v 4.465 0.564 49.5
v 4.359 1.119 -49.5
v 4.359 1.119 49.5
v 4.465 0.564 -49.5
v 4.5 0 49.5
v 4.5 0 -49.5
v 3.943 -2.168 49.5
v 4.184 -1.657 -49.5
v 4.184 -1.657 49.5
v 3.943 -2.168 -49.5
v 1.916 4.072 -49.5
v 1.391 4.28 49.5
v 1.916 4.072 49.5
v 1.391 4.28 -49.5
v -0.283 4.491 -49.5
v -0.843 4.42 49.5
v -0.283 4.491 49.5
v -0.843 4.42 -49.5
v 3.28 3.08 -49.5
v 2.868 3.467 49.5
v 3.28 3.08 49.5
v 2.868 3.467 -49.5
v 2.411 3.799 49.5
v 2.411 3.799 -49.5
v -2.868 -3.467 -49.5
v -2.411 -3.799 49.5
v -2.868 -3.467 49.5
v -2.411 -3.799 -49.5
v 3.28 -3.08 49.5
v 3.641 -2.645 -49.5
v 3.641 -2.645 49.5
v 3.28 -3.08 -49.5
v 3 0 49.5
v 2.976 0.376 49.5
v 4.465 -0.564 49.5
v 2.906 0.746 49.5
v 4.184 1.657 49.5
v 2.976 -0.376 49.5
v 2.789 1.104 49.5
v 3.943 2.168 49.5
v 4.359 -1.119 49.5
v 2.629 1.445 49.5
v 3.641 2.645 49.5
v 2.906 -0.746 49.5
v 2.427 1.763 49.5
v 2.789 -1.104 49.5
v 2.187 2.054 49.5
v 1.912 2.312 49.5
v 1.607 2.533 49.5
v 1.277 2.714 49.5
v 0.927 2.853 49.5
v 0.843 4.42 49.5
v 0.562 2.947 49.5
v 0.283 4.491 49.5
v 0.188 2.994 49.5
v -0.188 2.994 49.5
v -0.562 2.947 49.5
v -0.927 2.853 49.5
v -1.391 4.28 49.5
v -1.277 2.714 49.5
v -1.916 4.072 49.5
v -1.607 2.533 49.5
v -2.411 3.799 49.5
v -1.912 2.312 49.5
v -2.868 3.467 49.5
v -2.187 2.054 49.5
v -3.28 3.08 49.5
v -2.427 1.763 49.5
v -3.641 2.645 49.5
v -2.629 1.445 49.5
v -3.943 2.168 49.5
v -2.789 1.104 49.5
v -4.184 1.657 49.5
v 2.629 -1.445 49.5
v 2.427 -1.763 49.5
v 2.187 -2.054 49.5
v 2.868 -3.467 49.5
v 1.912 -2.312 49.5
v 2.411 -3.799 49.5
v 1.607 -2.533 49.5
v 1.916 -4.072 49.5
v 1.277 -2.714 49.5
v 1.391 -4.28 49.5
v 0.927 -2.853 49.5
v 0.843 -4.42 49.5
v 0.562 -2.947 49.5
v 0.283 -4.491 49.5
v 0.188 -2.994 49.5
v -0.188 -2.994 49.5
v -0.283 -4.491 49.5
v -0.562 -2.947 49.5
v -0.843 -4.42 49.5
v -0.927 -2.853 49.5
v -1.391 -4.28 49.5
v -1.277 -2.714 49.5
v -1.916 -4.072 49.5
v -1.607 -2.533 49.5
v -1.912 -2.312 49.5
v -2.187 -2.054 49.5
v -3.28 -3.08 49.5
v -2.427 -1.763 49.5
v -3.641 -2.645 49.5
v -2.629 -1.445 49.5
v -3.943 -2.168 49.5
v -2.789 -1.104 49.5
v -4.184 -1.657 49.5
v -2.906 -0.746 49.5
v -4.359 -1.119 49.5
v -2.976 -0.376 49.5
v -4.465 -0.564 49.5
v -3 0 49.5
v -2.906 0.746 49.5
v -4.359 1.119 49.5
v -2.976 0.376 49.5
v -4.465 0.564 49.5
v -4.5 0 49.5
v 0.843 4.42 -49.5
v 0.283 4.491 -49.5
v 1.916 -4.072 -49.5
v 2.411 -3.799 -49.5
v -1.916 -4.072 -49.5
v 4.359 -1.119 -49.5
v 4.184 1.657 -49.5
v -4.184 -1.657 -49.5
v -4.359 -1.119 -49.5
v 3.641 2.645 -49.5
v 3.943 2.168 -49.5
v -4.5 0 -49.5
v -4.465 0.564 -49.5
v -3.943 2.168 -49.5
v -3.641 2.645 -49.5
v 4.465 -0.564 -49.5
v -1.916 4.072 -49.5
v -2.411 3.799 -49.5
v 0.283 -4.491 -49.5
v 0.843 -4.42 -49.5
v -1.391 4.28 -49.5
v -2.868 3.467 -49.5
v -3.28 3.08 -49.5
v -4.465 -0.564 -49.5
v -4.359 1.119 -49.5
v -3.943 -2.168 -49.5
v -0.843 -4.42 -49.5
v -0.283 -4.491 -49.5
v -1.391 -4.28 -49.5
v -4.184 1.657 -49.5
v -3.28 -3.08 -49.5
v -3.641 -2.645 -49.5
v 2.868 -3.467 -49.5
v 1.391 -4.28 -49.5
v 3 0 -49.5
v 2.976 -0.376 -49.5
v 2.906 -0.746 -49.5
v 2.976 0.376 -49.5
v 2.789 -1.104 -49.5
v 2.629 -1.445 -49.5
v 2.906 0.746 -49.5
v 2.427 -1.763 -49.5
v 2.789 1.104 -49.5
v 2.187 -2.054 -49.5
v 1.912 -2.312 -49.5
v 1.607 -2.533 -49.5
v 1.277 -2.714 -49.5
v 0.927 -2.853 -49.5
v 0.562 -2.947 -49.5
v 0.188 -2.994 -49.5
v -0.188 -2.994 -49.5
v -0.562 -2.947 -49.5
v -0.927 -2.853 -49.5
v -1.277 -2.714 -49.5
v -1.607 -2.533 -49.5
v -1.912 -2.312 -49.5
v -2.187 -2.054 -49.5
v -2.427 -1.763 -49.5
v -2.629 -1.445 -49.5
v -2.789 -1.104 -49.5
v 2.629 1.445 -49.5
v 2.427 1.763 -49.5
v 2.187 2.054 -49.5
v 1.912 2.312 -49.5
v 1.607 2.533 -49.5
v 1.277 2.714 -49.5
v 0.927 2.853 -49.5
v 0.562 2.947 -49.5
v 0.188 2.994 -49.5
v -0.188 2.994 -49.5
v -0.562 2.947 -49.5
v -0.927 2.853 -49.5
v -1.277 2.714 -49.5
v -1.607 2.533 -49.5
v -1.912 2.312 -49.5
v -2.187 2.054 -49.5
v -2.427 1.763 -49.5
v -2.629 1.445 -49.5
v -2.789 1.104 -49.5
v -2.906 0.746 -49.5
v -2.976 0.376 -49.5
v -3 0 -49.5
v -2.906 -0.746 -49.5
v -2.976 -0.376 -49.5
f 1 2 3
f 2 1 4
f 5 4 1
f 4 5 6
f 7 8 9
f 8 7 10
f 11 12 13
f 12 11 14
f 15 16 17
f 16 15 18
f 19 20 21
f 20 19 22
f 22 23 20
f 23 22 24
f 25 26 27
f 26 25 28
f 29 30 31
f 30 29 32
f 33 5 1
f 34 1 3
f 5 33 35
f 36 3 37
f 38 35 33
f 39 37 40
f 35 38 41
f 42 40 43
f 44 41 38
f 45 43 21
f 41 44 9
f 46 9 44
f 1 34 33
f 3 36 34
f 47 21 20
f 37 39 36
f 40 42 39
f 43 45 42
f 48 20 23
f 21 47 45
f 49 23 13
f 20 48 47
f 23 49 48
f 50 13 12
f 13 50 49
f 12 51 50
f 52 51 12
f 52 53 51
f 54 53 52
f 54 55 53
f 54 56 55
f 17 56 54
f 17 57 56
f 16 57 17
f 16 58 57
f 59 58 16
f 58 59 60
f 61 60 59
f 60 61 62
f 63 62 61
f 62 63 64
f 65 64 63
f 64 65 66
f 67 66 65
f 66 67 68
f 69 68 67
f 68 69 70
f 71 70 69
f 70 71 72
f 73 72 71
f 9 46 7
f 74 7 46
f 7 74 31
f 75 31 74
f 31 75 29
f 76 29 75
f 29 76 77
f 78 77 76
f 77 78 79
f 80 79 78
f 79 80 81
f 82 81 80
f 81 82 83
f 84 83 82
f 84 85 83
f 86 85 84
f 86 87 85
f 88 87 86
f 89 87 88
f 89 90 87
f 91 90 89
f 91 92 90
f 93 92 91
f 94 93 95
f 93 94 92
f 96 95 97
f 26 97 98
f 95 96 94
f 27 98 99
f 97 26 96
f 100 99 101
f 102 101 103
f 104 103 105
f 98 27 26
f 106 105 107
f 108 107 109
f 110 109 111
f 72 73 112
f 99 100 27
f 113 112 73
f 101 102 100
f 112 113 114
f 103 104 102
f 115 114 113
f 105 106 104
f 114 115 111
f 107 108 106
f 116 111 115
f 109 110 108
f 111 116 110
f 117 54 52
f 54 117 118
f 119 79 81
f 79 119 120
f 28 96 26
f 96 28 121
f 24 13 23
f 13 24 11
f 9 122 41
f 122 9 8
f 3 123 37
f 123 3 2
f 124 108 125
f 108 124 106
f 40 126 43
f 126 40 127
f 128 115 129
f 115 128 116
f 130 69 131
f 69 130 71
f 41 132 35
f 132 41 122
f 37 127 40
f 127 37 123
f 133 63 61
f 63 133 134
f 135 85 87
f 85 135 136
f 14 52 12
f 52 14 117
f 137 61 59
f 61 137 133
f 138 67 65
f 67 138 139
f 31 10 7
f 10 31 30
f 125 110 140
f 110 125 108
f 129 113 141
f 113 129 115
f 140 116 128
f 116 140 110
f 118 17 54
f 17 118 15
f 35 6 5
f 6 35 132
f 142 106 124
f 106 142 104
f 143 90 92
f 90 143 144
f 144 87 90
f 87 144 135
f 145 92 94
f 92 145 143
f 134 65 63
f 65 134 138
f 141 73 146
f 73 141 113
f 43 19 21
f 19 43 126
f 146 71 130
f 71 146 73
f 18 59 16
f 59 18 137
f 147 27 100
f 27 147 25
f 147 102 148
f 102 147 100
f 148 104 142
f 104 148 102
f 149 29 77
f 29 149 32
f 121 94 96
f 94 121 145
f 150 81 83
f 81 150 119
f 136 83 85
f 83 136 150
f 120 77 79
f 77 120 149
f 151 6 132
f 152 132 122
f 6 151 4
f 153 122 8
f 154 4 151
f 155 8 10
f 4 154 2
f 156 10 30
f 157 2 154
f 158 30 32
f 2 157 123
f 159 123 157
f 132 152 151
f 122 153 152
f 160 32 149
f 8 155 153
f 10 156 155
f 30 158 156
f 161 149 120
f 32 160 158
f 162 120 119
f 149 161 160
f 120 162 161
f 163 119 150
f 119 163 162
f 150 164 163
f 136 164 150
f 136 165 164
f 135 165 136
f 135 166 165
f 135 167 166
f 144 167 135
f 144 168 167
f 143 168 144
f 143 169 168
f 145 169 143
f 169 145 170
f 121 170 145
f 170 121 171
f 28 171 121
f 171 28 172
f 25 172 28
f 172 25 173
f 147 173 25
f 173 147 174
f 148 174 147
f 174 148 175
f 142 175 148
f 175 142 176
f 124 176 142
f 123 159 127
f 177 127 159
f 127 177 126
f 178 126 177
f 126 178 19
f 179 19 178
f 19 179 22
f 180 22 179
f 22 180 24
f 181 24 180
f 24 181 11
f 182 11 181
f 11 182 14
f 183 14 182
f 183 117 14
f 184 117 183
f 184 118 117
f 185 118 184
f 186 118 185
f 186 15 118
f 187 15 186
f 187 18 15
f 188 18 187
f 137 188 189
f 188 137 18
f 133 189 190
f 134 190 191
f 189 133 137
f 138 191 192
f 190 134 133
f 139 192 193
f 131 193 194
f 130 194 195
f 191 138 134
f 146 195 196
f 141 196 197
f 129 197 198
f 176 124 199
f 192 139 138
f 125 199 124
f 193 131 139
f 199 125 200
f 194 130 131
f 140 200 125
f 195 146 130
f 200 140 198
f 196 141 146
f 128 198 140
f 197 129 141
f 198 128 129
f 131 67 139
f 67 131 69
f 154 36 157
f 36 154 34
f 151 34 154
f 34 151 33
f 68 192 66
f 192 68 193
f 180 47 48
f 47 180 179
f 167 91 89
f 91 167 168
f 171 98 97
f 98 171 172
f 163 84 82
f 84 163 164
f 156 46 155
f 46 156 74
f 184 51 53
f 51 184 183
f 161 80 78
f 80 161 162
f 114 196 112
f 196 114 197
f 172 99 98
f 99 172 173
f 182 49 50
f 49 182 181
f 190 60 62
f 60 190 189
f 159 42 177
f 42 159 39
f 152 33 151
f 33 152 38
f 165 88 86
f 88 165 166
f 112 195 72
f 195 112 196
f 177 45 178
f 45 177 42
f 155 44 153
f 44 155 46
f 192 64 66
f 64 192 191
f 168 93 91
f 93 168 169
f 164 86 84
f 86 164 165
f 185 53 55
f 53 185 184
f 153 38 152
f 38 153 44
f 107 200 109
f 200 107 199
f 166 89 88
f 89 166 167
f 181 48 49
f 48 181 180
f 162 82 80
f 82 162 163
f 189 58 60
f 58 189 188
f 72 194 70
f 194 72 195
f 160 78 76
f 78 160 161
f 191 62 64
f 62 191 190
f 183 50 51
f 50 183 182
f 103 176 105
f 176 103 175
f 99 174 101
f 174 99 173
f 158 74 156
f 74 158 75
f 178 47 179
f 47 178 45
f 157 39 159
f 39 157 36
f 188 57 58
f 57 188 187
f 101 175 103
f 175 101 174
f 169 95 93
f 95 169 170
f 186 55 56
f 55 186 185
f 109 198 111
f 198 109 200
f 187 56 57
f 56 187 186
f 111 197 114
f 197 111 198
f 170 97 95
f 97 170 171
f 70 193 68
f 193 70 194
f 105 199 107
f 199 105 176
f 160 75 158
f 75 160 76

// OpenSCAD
$fn = 50;


difference() {
	union() {
		translate(v = [0, 0, -49.5000000000]) {
			cylinder(h = 99, r = 4.5000000000);
		}
	}
	union() {
		translate(v = [0, 0, -100.0000000000]) {
			cylinder(h = 200, r = 3.0000000000);
		}
	}
}
